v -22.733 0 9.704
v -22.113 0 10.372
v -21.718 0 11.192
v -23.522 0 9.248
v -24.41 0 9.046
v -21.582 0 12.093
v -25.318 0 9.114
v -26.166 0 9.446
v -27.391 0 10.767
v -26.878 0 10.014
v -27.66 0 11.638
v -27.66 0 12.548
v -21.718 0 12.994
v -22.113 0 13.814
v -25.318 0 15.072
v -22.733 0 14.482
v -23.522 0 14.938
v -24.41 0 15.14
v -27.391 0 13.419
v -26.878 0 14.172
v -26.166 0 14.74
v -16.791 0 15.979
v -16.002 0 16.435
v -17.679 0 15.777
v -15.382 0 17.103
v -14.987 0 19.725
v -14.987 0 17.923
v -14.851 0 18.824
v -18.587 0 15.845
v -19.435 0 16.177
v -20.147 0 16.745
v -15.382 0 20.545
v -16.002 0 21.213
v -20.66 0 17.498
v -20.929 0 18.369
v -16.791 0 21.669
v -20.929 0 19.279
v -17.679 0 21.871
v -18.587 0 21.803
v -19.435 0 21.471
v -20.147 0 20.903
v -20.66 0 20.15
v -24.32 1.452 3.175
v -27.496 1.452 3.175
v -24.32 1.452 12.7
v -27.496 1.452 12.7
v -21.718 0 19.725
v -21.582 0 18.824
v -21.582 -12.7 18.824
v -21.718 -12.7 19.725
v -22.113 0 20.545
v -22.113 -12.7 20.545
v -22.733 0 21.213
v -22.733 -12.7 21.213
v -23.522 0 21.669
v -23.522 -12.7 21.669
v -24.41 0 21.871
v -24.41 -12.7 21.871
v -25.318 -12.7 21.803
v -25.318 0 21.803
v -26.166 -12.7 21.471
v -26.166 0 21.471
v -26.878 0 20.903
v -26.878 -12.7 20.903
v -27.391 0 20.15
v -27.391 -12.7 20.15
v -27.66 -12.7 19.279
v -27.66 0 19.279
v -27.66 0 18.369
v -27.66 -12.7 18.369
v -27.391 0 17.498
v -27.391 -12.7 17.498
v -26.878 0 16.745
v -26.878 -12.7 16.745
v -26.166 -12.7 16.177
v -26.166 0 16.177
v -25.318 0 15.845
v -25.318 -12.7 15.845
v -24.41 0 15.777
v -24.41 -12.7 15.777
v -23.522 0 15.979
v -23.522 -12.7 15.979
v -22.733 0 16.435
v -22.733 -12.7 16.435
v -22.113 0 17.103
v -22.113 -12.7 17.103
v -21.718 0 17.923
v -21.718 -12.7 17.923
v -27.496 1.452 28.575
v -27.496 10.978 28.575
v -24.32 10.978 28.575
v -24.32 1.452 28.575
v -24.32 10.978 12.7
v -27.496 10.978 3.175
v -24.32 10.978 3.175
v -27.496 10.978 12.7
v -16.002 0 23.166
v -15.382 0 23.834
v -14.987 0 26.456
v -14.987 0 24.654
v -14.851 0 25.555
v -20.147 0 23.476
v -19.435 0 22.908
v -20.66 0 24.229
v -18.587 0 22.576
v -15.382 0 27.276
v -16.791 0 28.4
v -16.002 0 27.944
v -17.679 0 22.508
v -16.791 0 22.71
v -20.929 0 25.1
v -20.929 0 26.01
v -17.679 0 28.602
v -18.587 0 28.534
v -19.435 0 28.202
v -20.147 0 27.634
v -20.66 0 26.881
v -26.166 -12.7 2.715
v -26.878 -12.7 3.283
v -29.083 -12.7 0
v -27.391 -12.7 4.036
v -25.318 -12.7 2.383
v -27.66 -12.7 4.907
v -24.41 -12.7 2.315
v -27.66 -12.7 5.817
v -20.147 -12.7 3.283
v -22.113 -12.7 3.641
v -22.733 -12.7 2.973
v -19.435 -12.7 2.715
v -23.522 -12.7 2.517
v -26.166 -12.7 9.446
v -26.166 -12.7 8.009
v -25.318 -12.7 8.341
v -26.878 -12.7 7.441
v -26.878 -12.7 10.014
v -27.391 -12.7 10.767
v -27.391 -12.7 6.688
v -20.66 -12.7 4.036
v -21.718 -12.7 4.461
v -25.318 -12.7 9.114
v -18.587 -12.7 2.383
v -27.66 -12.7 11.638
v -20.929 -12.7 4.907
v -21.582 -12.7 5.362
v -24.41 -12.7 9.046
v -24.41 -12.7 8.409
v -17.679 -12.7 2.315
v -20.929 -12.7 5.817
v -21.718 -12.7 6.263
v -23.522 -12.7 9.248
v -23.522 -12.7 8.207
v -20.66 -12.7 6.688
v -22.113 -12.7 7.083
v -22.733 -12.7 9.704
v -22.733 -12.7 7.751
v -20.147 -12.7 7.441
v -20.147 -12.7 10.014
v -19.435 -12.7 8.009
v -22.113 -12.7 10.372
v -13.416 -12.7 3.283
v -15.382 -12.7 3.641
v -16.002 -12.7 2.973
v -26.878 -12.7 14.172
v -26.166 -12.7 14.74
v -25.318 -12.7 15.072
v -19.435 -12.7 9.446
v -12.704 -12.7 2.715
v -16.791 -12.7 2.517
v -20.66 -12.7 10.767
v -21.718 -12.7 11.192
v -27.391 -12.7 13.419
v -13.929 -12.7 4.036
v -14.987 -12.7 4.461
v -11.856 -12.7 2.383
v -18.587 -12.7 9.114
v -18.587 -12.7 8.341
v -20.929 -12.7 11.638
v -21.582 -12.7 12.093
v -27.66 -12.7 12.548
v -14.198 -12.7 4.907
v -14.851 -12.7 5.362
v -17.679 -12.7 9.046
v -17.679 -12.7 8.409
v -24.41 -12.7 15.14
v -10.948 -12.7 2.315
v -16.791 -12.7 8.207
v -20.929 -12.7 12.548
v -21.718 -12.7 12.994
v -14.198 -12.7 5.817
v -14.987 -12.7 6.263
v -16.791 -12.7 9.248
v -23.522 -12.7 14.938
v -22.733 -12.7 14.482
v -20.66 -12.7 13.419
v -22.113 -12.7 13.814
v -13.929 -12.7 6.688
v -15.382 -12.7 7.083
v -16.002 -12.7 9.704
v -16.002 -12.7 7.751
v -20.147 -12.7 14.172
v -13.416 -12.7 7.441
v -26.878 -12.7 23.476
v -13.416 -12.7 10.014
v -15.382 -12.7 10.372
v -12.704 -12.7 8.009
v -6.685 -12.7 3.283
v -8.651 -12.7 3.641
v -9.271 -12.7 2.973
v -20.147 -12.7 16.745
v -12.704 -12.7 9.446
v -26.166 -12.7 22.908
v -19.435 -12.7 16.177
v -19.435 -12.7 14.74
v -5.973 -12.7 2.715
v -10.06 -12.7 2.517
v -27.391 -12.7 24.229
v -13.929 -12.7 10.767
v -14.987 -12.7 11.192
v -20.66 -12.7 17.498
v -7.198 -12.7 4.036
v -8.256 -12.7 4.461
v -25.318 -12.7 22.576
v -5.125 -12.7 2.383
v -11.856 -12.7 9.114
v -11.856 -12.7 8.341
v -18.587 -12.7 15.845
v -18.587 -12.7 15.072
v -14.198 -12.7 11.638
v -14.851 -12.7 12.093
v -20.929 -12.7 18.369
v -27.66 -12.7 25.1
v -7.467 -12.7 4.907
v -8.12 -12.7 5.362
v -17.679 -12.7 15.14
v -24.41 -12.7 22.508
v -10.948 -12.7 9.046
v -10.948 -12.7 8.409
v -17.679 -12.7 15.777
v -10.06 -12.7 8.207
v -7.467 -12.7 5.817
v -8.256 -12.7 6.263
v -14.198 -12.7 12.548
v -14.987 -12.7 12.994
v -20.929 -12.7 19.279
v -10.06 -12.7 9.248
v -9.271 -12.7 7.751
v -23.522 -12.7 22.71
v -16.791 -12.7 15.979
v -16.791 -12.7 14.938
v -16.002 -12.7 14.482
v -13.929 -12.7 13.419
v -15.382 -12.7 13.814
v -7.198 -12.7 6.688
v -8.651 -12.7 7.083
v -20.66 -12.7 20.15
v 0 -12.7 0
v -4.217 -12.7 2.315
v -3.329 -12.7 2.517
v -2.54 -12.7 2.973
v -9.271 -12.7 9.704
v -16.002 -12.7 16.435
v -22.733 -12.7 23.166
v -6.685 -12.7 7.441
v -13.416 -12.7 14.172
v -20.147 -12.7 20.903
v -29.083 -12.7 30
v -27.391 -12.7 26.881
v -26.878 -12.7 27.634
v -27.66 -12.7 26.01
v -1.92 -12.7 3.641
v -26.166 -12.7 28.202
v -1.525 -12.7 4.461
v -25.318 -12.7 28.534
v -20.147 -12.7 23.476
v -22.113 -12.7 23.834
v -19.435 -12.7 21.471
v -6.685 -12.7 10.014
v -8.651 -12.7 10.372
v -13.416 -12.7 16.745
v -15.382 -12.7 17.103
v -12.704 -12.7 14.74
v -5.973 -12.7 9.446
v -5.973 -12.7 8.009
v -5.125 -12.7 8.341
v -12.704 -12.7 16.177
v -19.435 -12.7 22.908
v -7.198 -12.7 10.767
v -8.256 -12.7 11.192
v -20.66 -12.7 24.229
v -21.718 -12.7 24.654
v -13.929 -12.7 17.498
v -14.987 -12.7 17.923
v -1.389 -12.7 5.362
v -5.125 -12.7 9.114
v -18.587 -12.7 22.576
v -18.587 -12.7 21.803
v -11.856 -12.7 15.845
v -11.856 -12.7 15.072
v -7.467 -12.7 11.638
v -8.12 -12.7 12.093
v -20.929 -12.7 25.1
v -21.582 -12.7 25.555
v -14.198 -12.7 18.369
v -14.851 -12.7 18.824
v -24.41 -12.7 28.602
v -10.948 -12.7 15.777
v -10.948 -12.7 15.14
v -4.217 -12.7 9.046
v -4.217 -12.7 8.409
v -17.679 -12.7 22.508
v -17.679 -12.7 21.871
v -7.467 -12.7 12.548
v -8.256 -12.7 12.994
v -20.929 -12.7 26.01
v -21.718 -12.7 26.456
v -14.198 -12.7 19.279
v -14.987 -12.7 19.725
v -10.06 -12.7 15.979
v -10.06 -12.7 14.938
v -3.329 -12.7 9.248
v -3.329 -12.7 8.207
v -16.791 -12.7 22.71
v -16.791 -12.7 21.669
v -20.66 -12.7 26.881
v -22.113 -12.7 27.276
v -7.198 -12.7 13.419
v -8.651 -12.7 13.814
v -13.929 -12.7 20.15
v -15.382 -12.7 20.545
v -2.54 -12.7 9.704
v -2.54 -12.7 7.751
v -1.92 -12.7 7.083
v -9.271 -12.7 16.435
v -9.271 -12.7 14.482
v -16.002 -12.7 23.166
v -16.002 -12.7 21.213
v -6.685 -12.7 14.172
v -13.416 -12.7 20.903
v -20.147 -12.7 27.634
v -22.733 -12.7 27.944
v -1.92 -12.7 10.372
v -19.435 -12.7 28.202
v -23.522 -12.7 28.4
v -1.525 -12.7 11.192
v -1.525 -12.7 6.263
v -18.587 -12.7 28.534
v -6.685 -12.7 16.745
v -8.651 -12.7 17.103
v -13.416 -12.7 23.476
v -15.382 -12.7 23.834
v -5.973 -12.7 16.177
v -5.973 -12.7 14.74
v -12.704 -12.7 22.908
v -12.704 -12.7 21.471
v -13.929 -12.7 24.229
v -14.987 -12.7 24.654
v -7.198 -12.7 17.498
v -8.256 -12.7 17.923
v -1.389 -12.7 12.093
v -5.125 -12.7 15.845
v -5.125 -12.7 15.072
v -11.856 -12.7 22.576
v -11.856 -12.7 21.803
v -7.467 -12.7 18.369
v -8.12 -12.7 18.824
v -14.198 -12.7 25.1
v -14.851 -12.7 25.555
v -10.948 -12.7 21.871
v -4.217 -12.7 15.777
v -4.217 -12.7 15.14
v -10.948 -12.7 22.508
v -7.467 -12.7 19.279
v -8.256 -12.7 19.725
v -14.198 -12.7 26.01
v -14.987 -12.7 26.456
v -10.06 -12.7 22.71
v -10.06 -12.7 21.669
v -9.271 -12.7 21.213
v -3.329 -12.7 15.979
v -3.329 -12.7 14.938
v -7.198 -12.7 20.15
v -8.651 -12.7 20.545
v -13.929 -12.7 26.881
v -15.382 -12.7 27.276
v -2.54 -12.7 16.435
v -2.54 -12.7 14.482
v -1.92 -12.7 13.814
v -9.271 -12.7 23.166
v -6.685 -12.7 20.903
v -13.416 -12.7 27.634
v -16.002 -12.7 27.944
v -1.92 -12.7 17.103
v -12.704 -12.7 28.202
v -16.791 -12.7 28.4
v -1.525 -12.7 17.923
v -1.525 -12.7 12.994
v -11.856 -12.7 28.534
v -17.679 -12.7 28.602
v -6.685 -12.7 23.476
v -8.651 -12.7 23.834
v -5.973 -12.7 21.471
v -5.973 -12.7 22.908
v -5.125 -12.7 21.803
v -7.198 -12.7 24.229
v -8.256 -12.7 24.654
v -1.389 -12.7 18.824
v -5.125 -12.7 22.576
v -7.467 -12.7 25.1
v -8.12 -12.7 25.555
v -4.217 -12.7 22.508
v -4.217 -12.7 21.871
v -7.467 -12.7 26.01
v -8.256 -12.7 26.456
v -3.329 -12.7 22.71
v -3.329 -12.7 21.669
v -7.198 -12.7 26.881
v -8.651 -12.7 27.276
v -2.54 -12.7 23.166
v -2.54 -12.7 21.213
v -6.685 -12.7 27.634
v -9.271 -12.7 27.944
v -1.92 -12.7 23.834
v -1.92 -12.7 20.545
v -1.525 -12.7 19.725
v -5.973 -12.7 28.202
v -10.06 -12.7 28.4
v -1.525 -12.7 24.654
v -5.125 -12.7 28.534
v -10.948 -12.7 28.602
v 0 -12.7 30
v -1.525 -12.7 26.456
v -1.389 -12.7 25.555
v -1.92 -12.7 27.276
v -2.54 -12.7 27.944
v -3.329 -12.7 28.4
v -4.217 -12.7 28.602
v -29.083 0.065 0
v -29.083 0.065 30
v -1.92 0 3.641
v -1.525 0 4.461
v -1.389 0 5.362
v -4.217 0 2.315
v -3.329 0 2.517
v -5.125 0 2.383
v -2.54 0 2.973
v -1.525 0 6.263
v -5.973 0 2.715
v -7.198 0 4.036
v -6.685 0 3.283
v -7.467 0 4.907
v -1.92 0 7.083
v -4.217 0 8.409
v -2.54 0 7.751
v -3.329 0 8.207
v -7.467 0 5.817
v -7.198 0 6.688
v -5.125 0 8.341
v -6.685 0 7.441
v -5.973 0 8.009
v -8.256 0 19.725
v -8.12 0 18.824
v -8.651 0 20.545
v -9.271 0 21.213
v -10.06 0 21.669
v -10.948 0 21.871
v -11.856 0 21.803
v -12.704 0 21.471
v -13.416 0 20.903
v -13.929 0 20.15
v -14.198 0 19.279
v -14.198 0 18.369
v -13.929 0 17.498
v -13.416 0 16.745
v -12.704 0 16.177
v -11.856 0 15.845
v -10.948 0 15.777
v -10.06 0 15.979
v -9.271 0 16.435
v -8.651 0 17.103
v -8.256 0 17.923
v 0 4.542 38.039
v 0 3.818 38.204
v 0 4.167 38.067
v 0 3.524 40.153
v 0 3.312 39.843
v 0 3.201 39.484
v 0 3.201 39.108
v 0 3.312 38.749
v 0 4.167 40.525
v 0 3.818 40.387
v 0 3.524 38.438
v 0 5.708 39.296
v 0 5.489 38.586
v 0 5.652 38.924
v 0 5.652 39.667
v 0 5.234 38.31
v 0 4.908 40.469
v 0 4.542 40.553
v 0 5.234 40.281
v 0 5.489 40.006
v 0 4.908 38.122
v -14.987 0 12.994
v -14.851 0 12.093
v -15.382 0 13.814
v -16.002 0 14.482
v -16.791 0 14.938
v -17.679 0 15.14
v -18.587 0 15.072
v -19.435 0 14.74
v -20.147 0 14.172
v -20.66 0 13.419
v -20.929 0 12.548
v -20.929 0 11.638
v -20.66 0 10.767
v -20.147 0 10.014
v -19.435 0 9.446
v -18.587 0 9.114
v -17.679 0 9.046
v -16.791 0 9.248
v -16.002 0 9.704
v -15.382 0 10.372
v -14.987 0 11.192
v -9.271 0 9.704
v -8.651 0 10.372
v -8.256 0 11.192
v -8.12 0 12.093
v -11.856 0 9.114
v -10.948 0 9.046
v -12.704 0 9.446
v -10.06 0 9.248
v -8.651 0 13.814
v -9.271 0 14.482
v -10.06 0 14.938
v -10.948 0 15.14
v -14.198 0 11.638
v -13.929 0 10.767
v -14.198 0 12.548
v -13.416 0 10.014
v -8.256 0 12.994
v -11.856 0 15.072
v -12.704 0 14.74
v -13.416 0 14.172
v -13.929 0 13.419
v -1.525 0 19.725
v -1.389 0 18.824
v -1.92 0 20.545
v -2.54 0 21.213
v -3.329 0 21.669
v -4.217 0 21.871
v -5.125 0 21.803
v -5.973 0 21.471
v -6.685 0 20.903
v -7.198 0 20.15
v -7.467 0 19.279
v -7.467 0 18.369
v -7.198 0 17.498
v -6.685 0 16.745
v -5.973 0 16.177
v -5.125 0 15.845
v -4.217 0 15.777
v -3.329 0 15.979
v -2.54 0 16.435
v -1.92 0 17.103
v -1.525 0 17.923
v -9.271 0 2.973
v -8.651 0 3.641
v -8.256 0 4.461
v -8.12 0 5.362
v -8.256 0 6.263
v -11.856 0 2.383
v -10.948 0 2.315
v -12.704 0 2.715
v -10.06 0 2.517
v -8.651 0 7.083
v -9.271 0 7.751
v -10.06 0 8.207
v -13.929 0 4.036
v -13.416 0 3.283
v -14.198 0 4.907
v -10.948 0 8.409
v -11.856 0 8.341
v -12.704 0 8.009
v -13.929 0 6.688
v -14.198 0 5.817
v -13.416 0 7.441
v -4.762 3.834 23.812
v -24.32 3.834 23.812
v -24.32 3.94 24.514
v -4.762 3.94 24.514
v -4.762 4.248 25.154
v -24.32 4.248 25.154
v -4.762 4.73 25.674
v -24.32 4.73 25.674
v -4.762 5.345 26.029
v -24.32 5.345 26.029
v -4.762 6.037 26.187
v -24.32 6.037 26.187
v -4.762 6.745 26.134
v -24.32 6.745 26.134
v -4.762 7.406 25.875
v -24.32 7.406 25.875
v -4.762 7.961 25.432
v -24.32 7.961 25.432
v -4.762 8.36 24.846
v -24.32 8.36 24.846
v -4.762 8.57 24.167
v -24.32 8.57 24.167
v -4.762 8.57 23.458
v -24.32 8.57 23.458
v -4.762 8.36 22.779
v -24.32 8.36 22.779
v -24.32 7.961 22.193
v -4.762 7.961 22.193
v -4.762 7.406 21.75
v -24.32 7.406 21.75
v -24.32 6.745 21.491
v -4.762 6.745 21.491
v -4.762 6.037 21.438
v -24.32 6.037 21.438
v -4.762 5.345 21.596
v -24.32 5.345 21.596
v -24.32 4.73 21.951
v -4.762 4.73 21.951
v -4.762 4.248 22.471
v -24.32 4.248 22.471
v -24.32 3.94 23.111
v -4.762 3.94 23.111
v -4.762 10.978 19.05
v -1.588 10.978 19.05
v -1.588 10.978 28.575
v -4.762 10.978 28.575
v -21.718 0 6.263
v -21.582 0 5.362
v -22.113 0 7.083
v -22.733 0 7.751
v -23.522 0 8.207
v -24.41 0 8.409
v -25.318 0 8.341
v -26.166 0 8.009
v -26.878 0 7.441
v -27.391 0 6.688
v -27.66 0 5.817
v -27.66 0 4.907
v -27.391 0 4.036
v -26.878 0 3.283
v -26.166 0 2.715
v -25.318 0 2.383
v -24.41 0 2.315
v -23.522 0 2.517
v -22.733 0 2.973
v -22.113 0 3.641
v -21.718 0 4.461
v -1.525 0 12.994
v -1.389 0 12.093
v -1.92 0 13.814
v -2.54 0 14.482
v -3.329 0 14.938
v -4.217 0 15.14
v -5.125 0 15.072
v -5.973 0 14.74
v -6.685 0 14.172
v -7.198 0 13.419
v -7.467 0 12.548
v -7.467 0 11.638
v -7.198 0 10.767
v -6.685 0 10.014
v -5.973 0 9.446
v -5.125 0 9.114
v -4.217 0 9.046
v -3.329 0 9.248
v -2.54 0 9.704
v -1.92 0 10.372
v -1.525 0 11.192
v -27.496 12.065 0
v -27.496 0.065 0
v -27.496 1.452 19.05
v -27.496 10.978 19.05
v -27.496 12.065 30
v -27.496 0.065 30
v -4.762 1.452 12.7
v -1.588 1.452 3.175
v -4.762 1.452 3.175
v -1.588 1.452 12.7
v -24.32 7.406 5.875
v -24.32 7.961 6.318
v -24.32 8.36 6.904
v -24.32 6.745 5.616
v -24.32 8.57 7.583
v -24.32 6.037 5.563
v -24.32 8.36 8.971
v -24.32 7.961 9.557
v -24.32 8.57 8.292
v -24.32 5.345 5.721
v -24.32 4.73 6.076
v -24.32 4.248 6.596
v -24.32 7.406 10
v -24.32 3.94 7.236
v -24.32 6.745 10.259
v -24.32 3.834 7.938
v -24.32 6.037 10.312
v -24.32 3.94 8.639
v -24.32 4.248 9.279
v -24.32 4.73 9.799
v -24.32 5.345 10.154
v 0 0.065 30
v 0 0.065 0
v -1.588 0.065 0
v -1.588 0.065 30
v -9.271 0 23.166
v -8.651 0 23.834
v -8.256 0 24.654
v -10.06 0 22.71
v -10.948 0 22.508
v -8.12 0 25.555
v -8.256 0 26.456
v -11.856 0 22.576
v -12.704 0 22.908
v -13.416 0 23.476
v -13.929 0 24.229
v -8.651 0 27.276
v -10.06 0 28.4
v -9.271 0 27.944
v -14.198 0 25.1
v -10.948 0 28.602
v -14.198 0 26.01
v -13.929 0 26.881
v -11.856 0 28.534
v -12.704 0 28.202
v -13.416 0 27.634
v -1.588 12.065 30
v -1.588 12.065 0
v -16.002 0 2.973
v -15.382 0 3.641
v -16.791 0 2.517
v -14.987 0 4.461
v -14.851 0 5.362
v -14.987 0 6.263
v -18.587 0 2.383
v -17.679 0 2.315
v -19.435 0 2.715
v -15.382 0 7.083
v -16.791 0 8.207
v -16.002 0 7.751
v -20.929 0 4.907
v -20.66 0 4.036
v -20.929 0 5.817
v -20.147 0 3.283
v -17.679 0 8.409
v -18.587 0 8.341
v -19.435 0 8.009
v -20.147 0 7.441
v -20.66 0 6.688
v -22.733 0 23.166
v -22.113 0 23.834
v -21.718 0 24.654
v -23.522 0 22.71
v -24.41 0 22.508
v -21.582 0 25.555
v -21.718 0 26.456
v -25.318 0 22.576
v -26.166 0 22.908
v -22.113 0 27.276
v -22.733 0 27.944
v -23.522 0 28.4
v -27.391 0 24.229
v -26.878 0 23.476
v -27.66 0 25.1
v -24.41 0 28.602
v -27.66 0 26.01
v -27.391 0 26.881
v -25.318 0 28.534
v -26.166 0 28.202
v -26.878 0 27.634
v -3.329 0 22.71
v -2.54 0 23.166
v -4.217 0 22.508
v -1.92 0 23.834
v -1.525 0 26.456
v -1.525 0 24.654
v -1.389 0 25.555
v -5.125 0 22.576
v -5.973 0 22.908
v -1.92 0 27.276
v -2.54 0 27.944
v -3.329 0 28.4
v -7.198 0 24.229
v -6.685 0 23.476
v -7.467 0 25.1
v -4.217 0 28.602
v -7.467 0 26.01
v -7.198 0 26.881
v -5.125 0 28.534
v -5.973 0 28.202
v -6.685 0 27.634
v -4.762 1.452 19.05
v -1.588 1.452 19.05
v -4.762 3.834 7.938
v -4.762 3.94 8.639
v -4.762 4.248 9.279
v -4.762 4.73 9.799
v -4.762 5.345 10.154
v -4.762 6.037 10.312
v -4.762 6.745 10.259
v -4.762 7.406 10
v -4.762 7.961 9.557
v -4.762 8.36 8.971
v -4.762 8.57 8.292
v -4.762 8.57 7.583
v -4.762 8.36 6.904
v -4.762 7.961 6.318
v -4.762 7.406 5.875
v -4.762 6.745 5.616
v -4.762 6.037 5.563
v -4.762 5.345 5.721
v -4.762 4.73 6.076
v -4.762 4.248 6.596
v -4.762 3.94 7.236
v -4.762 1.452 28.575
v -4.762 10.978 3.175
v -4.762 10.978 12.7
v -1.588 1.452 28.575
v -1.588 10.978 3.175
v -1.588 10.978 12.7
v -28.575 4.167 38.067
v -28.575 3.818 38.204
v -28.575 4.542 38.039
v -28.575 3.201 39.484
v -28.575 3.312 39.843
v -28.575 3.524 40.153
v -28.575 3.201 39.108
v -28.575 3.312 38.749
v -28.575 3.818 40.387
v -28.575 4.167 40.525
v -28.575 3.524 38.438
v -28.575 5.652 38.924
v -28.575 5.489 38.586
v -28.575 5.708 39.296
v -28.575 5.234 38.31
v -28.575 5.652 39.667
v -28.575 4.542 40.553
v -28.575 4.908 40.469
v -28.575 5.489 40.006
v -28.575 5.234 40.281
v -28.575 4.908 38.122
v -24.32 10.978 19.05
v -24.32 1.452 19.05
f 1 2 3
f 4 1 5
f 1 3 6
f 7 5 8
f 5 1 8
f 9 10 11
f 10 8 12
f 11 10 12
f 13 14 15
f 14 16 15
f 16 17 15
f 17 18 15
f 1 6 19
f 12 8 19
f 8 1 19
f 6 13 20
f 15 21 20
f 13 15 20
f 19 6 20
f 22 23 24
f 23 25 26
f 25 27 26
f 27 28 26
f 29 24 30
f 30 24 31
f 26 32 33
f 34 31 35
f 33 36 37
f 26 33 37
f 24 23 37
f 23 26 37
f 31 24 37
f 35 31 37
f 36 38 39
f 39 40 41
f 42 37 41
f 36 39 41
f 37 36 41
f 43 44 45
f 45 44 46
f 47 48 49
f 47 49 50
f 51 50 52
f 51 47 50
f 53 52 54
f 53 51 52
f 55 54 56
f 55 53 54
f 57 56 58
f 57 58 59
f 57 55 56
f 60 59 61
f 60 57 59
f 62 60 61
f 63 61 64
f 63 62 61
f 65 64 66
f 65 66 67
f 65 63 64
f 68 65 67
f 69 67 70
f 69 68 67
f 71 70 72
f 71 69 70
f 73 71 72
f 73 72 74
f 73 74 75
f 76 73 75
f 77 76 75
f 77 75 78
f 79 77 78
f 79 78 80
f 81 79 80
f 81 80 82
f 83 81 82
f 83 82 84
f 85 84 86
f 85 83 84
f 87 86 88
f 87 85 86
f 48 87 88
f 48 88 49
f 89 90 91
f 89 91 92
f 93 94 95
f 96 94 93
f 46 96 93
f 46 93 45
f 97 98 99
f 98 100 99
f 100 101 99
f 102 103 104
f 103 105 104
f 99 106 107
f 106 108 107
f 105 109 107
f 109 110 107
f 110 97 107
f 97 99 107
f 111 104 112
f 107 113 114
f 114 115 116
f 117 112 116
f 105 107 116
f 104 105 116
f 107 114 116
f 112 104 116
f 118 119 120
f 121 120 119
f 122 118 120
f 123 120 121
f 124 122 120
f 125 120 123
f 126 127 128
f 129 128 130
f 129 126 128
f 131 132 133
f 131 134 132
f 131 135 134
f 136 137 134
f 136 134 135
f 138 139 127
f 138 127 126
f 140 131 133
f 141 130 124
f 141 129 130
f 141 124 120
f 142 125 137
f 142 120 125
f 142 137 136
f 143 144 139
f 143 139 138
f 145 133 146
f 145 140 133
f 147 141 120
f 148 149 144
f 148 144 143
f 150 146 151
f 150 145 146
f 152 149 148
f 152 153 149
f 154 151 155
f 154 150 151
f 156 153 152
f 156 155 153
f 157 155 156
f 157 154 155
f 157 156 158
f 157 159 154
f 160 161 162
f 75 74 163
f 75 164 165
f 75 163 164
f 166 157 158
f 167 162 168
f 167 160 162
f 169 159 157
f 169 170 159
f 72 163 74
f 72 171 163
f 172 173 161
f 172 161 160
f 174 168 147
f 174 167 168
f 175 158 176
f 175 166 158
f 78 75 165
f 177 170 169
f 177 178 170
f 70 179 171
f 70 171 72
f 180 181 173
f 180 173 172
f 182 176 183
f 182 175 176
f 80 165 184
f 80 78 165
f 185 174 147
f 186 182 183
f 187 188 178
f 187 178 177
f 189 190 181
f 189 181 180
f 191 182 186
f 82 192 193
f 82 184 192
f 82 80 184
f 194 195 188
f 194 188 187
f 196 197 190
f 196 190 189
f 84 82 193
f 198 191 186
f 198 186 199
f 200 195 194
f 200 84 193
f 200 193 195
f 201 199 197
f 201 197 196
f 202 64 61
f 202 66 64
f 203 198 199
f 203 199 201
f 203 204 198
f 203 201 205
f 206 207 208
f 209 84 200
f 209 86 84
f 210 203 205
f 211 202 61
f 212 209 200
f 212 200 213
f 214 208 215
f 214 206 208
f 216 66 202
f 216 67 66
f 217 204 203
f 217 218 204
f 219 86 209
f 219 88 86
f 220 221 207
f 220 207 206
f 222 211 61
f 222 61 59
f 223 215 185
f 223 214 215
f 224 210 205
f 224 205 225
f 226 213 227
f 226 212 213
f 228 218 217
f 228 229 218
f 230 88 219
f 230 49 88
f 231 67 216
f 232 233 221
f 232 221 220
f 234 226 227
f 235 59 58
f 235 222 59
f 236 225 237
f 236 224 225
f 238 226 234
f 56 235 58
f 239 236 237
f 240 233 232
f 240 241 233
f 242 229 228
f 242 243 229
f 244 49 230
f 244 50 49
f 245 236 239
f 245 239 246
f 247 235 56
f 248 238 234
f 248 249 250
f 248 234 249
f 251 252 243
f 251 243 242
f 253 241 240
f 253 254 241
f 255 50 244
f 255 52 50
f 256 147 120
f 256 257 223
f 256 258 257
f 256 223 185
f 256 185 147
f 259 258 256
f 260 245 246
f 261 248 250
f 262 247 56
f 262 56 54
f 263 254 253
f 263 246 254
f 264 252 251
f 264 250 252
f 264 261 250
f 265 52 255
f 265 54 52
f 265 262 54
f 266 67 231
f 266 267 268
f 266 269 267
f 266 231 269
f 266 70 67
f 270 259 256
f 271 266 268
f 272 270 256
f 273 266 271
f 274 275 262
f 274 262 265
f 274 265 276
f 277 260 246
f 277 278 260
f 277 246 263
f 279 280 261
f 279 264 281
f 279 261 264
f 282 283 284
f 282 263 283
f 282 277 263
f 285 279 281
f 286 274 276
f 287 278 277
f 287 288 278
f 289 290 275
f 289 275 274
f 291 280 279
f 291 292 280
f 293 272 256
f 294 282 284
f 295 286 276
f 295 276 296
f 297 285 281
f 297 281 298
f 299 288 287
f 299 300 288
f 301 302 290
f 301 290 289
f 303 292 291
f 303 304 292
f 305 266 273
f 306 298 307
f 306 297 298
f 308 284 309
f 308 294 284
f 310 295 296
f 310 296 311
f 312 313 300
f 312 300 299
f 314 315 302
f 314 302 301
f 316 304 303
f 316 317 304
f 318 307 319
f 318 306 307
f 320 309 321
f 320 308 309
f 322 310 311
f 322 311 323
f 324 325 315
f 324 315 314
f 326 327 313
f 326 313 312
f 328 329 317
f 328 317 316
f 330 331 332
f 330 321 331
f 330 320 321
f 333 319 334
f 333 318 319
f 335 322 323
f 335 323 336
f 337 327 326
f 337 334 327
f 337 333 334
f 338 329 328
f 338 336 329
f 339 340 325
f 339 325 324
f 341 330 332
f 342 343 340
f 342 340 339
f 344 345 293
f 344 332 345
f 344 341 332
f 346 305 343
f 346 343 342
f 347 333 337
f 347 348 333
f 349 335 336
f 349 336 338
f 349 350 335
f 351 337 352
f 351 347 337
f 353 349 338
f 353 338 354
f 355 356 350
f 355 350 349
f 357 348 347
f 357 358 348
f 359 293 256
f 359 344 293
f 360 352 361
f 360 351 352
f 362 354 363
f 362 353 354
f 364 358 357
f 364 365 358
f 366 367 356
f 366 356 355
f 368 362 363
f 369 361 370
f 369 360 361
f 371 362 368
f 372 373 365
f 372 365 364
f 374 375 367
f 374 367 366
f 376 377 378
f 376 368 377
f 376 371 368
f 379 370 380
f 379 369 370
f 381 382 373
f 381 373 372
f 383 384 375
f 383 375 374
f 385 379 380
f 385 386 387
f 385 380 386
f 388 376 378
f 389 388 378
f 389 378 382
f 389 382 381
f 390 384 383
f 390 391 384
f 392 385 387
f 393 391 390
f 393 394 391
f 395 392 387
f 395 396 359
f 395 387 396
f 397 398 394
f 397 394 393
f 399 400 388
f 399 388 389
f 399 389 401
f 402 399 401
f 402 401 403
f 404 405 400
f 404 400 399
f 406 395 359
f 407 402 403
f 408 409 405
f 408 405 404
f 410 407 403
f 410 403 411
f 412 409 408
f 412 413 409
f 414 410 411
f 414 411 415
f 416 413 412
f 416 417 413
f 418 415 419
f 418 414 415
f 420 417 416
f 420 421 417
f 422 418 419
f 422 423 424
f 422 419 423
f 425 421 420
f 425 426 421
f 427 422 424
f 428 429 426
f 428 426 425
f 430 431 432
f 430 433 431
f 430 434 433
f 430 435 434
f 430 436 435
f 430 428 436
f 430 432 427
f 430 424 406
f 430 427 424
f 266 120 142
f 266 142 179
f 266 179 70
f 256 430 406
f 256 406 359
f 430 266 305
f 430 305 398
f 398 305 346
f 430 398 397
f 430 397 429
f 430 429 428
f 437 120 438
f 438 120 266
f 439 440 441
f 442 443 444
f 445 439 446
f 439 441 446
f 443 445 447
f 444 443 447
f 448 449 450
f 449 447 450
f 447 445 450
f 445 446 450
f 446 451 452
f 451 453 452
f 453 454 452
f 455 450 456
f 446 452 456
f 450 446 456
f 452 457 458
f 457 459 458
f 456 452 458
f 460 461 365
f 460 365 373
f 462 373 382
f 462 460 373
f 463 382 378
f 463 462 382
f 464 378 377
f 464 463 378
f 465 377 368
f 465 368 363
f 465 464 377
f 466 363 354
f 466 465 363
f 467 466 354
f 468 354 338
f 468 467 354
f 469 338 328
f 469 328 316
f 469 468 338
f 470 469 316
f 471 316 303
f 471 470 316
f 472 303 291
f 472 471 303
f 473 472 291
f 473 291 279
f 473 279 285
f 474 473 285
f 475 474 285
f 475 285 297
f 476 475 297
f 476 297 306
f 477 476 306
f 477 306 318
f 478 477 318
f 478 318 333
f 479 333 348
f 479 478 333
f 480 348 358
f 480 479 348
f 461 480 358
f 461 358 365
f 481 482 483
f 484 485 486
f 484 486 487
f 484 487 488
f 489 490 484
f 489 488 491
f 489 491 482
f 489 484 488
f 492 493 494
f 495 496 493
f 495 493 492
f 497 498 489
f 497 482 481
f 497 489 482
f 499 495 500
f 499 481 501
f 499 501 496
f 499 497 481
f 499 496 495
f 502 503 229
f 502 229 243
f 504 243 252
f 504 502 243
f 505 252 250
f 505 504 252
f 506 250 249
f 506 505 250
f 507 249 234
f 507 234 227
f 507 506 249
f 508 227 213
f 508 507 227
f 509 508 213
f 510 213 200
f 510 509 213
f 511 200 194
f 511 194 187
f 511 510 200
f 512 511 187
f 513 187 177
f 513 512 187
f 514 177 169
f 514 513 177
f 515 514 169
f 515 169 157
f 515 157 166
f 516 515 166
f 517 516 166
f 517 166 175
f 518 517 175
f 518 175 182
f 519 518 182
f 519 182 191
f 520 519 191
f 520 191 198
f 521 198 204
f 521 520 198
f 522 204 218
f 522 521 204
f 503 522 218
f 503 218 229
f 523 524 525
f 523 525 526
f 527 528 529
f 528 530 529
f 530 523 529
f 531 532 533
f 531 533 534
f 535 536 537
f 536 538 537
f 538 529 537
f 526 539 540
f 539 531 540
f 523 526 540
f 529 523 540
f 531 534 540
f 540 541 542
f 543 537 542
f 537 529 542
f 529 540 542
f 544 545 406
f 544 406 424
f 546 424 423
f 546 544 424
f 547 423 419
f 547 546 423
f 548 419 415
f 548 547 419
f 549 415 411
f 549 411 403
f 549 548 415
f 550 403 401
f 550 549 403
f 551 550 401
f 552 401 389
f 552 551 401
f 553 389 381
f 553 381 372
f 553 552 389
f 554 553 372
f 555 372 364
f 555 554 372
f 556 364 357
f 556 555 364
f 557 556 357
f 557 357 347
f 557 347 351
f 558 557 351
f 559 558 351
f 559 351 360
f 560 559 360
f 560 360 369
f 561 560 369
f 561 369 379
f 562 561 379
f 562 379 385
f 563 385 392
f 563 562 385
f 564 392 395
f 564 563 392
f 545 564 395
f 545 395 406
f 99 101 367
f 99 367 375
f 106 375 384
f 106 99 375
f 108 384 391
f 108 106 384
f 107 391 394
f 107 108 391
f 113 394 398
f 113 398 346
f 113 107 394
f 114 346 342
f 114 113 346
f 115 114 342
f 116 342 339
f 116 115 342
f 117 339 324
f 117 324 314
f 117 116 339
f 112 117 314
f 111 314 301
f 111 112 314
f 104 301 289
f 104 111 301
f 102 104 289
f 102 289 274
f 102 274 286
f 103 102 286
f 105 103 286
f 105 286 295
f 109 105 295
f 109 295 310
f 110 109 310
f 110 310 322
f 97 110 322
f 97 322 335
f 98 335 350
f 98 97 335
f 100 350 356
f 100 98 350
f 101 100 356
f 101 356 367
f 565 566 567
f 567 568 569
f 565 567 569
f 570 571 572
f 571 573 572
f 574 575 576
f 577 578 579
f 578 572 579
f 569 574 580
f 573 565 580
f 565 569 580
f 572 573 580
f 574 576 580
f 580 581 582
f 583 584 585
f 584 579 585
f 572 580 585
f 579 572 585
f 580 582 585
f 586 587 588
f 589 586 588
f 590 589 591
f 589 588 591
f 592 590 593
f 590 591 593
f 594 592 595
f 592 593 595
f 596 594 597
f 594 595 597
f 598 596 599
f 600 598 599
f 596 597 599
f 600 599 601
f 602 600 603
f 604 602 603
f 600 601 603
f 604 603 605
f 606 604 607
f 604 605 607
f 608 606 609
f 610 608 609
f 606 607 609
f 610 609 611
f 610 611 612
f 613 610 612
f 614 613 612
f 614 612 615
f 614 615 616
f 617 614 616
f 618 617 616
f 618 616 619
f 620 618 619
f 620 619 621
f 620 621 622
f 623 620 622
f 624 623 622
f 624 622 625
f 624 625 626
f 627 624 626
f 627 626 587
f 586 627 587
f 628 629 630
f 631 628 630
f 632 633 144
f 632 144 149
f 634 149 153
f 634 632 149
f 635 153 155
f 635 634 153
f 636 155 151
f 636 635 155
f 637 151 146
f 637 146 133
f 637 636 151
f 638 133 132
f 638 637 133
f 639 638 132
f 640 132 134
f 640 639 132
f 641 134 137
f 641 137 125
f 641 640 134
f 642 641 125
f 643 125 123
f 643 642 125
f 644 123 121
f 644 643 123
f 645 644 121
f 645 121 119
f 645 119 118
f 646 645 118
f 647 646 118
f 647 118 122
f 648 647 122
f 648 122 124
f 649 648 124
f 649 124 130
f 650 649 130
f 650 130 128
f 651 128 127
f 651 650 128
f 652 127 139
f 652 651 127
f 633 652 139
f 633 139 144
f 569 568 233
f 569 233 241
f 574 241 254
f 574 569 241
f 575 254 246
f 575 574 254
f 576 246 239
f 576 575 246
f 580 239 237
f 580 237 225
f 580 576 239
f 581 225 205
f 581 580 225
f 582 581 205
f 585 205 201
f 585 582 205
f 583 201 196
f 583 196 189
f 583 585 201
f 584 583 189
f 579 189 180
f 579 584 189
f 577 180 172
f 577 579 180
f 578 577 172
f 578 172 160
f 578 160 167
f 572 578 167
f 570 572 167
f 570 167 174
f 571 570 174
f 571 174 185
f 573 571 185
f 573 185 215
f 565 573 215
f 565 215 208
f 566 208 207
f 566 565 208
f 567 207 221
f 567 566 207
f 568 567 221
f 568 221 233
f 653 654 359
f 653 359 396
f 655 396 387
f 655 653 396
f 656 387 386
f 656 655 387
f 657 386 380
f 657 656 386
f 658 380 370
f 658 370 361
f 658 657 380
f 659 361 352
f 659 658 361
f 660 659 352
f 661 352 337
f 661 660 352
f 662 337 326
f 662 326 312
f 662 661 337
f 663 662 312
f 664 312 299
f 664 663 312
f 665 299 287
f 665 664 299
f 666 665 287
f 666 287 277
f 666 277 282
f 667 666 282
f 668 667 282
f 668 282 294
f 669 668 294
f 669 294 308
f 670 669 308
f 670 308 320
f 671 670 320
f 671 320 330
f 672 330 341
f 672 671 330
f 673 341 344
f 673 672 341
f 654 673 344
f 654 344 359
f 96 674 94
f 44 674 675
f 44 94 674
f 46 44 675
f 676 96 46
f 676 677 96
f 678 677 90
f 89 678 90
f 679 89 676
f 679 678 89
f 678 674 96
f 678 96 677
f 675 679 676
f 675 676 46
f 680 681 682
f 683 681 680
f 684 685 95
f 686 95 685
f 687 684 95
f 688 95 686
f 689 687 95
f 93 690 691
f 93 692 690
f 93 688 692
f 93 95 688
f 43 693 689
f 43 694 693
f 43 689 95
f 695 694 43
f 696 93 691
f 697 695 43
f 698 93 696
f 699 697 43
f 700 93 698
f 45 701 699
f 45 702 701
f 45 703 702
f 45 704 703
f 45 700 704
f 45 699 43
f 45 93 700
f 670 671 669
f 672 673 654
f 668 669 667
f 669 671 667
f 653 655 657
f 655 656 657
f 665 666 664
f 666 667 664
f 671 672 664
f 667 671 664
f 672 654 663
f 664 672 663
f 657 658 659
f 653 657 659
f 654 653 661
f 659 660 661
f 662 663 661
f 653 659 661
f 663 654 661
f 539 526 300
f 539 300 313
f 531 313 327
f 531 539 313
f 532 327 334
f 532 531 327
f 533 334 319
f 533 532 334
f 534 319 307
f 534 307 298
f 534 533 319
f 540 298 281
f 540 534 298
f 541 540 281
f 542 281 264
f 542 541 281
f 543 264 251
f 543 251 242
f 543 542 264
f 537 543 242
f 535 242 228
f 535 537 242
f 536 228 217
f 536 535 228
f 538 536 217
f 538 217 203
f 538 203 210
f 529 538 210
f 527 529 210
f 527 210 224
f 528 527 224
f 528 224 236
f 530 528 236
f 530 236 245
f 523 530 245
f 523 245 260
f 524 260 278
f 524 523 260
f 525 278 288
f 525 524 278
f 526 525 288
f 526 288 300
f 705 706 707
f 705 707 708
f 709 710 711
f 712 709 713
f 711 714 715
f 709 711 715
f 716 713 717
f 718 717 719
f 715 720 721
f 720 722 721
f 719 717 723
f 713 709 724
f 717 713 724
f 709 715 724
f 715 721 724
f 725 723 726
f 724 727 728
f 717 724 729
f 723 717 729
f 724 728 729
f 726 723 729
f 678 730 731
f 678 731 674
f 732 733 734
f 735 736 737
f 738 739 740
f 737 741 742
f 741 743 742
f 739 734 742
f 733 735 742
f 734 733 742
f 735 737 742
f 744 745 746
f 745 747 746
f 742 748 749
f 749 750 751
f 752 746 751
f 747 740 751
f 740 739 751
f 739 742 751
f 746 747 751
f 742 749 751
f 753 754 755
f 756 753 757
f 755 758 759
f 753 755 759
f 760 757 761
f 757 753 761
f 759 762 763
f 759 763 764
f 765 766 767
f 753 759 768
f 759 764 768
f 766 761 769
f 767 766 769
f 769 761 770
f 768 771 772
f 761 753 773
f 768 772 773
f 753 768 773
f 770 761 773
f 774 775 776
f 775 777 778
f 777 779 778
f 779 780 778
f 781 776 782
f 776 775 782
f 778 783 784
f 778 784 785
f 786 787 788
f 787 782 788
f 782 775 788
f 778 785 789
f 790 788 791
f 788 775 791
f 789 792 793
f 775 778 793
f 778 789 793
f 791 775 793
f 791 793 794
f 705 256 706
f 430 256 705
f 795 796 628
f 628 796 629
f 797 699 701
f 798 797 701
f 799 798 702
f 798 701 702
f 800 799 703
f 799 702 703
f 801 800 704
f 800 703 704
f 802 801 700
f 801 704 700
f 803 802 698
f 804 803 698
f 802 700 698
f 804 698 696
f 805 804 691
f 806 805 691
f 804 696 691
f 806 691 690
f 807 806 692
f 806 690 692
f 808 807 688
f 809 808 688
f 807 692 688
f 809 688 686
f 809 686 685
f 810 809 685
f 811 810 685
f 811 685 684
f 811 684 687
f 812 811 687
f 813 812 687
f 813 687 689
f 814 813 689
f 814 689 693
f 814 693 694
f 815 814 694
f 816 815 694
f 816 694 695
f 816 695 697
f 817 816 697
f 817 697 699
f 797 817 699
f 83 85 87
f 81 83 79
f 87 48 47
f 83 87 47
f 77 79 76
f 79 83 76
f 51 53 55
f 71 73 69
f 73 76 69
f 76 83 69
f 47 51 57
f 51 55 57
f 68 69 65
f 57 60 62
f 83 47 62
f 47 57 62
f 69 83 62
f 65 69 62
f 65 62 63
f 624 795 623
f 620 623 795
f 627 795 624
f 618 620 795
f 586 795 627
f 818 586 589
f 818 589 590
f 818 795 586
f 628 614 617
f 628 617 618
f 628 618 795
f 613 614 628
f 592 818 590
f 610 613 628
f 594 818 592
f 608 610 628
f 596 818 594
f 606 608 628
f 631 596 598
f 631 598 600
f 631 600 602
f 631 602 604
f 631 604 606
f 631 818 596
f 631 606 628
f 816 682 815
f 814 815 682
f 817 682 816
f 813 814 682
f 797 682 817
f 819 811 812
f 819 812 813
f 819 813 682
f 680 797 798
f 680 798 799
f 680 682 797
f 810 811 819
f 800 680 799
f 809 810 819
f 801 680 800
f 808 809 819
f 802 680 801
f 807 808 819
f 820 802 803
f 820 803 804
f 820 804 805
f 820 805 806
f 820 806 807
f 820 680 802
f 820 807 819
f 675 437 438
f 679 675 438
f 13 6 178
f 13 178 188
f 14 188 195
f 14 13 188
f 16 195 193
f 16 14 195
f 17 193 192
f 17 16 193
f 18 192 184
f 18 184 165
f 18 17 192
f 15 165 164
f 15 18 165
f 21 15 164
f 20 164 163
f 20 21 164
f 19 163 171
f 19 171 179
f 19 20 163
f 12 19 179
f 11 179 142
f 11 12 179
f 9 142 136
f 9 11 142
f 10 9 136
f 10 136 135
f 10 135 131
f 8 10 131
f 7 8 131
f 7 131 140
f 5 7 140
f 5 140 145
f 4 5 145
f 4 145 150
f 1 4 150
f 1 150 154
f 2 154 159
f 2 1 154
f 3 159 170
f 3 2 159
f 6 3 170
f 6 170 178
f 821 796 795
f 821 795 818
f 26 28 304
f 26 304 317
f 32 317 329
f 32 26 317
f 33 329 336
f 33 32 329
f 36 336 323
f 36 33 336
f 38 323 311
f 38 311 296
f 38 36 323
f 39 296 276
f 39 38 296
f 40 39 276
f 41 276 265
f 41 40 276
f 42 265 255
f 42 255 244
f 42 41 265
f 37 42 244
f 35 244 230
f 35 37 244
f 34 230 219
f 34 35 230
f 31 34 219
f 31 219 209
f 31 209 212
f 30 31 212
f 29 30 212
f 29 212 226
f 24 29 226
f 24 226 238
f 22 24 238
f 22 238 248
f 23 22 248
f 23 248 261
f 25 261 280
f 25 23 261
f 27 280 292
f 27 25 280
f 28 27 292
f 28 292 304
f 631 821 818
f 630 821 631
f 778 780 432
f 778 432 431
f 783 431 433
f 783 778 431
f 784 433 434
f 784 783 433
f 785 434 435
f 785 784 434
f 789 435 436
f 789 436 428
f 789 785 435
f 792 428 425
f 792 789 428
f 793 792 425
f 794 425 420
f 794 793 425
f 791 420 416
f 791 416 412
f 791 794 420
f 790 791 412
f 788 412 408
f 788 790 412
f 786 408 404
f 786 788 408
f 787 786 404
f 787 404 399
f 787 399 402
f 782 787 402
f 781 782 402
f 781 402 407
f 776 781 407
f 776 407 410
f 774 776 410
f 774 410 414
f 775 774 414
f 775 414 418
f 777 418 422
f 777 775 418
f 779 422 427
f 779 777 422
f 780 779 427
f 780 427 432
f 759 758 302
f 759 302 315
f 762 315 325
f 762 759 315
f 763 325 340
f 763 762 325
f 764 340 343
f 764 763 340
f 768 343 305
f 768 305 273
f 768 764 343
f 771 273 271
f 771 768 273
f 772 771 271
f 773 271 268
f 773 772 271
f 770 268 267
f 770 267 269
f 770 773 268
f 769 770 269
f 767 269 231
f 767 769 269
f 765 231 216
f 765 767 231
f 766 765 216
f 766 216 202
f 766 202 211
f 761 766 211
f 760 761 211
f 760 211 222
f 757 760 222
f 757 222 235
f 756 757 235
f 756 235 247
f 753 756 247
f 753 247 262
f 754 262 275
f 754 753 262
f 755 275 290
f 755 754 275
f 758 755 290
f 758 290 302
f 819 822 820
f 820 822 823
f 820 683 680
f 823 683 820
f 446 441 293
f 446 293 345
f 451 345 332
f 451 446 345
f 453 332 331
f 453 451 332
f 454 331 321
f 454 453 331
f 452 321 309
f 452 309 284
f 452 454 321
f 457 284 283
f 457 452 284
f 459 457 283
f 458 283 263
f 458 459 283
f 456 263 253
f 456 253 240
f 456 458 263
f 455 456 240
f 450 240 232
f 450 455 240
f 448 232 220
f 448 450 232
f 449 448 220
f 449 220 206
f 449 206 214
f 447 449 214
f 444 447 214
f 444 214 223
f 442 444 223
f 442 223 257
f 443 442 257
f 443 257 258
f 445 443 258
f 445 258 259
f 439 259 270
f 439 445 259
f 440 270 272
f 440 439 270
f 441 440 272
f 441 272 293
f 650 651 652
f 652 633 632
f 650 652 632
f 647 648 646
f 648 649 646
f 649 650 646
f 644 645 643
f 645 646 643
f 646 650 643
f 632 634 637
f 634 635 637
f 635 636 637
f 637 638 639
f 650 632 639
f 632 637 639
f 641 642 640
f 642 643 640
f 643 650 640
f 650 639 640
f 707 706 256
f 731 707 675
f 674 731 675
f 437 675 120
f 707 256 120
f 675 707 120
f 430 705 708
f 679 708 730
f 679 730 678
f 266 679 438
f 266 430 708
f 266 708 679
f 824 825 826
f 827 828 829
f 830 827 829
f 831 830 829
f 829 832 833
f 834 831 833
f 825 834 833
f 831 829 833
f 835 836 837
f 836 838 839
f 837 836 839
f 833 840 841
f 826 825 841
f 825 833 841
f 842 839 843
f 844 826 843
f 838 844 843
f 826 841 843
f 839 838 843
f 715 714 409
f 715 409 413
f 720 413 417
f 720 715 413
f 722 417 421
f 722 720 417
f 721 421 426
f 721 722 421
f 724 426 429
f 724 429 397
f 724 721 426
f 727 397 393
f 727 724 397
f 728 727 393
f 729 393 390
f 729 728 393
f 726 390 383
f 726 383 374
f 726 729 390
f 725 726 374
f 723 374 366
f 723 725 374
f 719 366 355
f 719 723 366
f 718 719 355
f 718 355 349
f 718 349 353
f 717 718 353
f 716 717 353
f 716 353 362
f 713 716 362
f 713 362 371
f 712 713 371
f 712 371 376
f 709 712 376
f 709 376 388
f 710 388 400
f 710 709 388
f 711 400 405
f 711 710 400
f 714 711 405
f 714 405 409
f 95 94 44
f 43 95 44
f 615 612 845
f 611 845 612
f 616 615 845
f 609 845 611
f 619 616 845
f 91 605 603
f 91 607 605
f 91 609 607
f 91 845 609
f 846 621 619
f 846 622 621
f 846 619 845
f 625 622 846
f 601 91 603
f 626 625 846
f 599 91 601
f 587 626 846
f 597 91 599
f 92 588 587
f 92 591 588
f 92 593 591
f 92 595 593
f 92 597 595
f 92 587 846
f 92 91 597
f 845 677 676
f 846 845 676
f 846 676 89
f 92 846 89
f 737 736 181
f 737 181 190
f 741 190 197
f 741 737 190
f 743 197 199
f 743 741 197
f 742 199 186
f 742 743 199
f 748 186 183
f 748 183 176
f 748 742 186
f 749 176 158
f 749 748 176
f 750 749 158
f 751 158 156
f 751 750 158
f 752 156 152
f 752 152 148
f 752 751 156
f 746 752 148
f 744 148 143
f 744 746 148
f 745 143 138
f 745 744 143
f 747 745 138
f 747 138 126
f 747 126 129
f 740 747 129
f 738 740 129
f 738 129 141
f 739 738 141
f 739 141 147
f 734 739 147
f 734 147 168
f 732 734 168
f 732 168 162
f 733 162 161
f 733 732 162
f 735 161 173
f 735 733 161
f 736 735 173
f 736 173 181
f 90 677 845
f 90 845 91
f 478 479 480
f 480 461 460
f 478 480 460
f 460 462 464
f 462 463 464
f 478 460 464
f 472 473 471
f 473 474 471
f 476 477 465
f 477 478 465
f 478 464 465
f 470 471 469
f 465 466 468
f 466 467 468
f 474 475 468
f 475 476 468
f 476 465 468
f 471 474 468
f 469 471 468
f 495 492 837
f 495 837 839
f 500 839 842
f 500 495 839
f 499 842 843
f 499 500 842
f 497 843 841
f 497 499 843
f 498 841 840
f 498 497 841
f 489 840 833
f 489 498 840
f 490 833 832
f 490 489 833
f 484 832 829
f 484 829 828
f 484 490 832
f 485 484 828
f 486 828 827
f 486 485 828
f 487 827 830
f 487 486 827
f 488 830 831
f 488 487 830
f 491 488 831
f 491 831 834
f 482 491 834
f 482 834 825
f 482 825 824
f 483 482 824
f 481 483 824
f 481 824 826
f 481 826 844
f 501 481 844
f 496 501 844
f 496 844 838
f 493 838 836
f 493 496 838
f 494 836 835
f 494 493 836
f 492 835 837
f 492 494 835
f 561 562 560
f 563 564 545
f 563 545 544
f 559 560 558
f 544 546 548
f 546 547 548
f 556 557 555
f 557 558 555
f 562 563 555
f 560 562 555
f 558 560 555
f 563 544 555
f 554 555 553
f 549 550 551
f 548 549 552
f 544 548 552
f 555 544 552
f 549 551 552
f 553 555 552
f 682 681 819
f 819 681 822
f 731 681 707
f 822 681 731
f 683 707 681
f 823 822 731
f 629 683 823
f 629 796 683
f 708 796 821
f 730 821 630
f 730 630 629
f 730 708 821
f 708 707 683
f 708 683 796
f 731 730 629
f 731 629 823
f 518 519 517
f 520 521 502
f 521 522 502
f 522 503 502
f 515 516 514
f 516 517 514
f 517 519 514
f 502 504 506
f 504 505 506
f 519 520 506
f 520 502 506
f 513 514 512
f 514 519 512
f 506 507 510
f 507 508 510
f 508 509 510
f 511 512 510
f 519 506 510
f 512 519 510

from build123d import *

# Parameters (mm, degrees)
F0_W      = 29.083
F0_H      = 30
F0_R      = 3.055938
F1_DEPTH  = 12.7
F2_W      = 29.083
F2_H      = 30
F3_DEPTH  = 12.065
F4_W      = 12
F4_H      = 30
F5_DEPTH  = 1.5875
F6_W      = 12
F6_H      = 30
F7_DEPTH  = 1.5875
F8_R      = 2.38125
F9_DEPTH  = 27.4965
F10_W     = 9.525
F10_H     = 9.525
F12_DEPTH = 3.175
F11_W     = 9.525
F11_H     = 9.525
F13_DEPTH = 3.175
F14_R     = 1.260545
F15_DEPTH = 28.575


with BuildPart() as f1:
    # F0 (on Front) → F1 (new body)
    with BuildSketch(Plane.XZ):
        with Locations((-14.5415, 15)):
            Rectangle(F0_W, F0_H)
        with Locations((-24.638, 5.362)):
            Circle(F0_R, mode=Mode.SUBTRACT)
        with Locations((-17.907, 5.362)):
            Circle(F0_R, mode=Mode.SUBTRACT)
        with Locations((-24.638, 12.093)):
            Circle(F0_R, mode=Mode.SUBTRACT)
        with Locations((-17.907, 12.093)):
            Circle(F0_R, mode=Mode.SUBTRACT)
        with Locations((-11.176, 5.362)):
            Circle(F0_R, mode=Mode.SUBTRACT)
        with Locations((-4.445, 5.362)):
            Circle(F0_R, mode=Mode.SUBTRACT)
        with Locations((-11.176, 12.093)):
            Circle(F0_R, mode=Mode.SUBTRACT)
        with Locations((-4.445, 12.093)):
            Circle(F0_R, mode=Mode.SUBTRACT)
        with Locations((-24.638, 18.824)):
            Circle(F0_R, mode=Mode.SUBTRACT)
        with Locations((-17.907, 18.824)):
            Circle(F0_R, mode=Mode.SUBTRACT)
        with Locations((-24.638, 25.555)):
            Circle(F0_R, mode=Mode.SUBTRACT)
        with Locations((-17.907, 25.555)):
            Circle(F0_R, mode=Mode.SUBTRACT)
        with Locations((-11.176, 18.824)):
            Circle(F0_R, mode=Mode.SUBTRACT)
        with Locations((-4.445, 18.824)):
            Circle(F0_R, mode=Mode.SUBTRACT)
        with Locations((-11.176, 25.555)):
            Circle(F0_R, mode=Mode.SUBTRACT)
        with Locations((-4.445, 25.555)):
            Circle(F0_R, mode=Mode.SUBTRACT)
    extrude(amount=F1_DEPTH)

    # F2 (on face) → F3 (join)
    with BuildSketch(Plane(origin=(0, 0, 0), x_dir=(-1, 0, 0), z_dir=(0, 1, 0))):
        with Locations((14.5415, 15)):
            Rectangle(F2_W, F2_H)
    extrude(amount=F3_DEPTH)

    # F4 (on face) → F5 (cut)
    with BuildSketch(Plane.YZ):
        with Locations((6.065, 15)):
            Rectangle(F4_W, F4_H)
    extrude(amount=-F5_DEPTH, mode=Mode.SUBTRACT)

    # F6 (on face) → F7 (cut)
    with BuildSketch(Plane(origin=(-29.083, 0, 0), x_dir=(0, -1, 0), z_dir=(-1, 0, 0))):
        with Locations((-6.065, 15)):
            Rectangle(F6_W, F6_H)
    extrude(amount=-F7_DEPTH, mode=Mode.SUBTRACT)

    # F8 (on face) → F9 (cut, through all)
    with BuildSketch(Plane(origin=(-27.4955, 0, 0), x_dir=(0, -1, 0), z_dir=(-1, 0, 0))):
        with Locations((-6.215, 23.8125)):
            Circle(F8_R)
        with Locations((-6.215, 7.9375)):
            Circle(F8_R)
    extrude(amount=-F9_DEPTH, mode=Mode.SUBTRACT)

    # F10 (on face) → F12 (cut)
    with BuildSketch(Plane(origin=(-27.4955, 0, 0), x_dir=(0, -1, 0), z_dir=(-1, 0, 0))):
        with Locations((-6.215, 23.8125)):
            Rectangle(F10_W, F10_H)
        with Locations((-6.215, 7.9375)):
            Rectangle(F10_W, F10_H)
    extrude(amount=-F12_DEPTH, mode=Mode.SUBTRACT)

    # F11 (on face) → F13 (cut)
    with BuildSketch(Plane.YZ.offset(-1.5875)):
        with Locations((6.215, 23.8125)):
            Rectangle(F11_W, F11_H)
        with Locations((6.215, 7.9375)):
            Rectangle(F11_W, F11_H)
    extrude(amount=-F13_DEPTH, mode=Mode.SUBTRACT)


with BuildPart() as f15:
    # F14 (on face) → F15 (new body)
    with BuildSketch(Plane.YZ):
        with Locations((4.447935, 39.295714)):
            Circle(F14_R)
    extrude(amount=-F15_DEPTH)


solid = Compound([f1.part, f15.part])
